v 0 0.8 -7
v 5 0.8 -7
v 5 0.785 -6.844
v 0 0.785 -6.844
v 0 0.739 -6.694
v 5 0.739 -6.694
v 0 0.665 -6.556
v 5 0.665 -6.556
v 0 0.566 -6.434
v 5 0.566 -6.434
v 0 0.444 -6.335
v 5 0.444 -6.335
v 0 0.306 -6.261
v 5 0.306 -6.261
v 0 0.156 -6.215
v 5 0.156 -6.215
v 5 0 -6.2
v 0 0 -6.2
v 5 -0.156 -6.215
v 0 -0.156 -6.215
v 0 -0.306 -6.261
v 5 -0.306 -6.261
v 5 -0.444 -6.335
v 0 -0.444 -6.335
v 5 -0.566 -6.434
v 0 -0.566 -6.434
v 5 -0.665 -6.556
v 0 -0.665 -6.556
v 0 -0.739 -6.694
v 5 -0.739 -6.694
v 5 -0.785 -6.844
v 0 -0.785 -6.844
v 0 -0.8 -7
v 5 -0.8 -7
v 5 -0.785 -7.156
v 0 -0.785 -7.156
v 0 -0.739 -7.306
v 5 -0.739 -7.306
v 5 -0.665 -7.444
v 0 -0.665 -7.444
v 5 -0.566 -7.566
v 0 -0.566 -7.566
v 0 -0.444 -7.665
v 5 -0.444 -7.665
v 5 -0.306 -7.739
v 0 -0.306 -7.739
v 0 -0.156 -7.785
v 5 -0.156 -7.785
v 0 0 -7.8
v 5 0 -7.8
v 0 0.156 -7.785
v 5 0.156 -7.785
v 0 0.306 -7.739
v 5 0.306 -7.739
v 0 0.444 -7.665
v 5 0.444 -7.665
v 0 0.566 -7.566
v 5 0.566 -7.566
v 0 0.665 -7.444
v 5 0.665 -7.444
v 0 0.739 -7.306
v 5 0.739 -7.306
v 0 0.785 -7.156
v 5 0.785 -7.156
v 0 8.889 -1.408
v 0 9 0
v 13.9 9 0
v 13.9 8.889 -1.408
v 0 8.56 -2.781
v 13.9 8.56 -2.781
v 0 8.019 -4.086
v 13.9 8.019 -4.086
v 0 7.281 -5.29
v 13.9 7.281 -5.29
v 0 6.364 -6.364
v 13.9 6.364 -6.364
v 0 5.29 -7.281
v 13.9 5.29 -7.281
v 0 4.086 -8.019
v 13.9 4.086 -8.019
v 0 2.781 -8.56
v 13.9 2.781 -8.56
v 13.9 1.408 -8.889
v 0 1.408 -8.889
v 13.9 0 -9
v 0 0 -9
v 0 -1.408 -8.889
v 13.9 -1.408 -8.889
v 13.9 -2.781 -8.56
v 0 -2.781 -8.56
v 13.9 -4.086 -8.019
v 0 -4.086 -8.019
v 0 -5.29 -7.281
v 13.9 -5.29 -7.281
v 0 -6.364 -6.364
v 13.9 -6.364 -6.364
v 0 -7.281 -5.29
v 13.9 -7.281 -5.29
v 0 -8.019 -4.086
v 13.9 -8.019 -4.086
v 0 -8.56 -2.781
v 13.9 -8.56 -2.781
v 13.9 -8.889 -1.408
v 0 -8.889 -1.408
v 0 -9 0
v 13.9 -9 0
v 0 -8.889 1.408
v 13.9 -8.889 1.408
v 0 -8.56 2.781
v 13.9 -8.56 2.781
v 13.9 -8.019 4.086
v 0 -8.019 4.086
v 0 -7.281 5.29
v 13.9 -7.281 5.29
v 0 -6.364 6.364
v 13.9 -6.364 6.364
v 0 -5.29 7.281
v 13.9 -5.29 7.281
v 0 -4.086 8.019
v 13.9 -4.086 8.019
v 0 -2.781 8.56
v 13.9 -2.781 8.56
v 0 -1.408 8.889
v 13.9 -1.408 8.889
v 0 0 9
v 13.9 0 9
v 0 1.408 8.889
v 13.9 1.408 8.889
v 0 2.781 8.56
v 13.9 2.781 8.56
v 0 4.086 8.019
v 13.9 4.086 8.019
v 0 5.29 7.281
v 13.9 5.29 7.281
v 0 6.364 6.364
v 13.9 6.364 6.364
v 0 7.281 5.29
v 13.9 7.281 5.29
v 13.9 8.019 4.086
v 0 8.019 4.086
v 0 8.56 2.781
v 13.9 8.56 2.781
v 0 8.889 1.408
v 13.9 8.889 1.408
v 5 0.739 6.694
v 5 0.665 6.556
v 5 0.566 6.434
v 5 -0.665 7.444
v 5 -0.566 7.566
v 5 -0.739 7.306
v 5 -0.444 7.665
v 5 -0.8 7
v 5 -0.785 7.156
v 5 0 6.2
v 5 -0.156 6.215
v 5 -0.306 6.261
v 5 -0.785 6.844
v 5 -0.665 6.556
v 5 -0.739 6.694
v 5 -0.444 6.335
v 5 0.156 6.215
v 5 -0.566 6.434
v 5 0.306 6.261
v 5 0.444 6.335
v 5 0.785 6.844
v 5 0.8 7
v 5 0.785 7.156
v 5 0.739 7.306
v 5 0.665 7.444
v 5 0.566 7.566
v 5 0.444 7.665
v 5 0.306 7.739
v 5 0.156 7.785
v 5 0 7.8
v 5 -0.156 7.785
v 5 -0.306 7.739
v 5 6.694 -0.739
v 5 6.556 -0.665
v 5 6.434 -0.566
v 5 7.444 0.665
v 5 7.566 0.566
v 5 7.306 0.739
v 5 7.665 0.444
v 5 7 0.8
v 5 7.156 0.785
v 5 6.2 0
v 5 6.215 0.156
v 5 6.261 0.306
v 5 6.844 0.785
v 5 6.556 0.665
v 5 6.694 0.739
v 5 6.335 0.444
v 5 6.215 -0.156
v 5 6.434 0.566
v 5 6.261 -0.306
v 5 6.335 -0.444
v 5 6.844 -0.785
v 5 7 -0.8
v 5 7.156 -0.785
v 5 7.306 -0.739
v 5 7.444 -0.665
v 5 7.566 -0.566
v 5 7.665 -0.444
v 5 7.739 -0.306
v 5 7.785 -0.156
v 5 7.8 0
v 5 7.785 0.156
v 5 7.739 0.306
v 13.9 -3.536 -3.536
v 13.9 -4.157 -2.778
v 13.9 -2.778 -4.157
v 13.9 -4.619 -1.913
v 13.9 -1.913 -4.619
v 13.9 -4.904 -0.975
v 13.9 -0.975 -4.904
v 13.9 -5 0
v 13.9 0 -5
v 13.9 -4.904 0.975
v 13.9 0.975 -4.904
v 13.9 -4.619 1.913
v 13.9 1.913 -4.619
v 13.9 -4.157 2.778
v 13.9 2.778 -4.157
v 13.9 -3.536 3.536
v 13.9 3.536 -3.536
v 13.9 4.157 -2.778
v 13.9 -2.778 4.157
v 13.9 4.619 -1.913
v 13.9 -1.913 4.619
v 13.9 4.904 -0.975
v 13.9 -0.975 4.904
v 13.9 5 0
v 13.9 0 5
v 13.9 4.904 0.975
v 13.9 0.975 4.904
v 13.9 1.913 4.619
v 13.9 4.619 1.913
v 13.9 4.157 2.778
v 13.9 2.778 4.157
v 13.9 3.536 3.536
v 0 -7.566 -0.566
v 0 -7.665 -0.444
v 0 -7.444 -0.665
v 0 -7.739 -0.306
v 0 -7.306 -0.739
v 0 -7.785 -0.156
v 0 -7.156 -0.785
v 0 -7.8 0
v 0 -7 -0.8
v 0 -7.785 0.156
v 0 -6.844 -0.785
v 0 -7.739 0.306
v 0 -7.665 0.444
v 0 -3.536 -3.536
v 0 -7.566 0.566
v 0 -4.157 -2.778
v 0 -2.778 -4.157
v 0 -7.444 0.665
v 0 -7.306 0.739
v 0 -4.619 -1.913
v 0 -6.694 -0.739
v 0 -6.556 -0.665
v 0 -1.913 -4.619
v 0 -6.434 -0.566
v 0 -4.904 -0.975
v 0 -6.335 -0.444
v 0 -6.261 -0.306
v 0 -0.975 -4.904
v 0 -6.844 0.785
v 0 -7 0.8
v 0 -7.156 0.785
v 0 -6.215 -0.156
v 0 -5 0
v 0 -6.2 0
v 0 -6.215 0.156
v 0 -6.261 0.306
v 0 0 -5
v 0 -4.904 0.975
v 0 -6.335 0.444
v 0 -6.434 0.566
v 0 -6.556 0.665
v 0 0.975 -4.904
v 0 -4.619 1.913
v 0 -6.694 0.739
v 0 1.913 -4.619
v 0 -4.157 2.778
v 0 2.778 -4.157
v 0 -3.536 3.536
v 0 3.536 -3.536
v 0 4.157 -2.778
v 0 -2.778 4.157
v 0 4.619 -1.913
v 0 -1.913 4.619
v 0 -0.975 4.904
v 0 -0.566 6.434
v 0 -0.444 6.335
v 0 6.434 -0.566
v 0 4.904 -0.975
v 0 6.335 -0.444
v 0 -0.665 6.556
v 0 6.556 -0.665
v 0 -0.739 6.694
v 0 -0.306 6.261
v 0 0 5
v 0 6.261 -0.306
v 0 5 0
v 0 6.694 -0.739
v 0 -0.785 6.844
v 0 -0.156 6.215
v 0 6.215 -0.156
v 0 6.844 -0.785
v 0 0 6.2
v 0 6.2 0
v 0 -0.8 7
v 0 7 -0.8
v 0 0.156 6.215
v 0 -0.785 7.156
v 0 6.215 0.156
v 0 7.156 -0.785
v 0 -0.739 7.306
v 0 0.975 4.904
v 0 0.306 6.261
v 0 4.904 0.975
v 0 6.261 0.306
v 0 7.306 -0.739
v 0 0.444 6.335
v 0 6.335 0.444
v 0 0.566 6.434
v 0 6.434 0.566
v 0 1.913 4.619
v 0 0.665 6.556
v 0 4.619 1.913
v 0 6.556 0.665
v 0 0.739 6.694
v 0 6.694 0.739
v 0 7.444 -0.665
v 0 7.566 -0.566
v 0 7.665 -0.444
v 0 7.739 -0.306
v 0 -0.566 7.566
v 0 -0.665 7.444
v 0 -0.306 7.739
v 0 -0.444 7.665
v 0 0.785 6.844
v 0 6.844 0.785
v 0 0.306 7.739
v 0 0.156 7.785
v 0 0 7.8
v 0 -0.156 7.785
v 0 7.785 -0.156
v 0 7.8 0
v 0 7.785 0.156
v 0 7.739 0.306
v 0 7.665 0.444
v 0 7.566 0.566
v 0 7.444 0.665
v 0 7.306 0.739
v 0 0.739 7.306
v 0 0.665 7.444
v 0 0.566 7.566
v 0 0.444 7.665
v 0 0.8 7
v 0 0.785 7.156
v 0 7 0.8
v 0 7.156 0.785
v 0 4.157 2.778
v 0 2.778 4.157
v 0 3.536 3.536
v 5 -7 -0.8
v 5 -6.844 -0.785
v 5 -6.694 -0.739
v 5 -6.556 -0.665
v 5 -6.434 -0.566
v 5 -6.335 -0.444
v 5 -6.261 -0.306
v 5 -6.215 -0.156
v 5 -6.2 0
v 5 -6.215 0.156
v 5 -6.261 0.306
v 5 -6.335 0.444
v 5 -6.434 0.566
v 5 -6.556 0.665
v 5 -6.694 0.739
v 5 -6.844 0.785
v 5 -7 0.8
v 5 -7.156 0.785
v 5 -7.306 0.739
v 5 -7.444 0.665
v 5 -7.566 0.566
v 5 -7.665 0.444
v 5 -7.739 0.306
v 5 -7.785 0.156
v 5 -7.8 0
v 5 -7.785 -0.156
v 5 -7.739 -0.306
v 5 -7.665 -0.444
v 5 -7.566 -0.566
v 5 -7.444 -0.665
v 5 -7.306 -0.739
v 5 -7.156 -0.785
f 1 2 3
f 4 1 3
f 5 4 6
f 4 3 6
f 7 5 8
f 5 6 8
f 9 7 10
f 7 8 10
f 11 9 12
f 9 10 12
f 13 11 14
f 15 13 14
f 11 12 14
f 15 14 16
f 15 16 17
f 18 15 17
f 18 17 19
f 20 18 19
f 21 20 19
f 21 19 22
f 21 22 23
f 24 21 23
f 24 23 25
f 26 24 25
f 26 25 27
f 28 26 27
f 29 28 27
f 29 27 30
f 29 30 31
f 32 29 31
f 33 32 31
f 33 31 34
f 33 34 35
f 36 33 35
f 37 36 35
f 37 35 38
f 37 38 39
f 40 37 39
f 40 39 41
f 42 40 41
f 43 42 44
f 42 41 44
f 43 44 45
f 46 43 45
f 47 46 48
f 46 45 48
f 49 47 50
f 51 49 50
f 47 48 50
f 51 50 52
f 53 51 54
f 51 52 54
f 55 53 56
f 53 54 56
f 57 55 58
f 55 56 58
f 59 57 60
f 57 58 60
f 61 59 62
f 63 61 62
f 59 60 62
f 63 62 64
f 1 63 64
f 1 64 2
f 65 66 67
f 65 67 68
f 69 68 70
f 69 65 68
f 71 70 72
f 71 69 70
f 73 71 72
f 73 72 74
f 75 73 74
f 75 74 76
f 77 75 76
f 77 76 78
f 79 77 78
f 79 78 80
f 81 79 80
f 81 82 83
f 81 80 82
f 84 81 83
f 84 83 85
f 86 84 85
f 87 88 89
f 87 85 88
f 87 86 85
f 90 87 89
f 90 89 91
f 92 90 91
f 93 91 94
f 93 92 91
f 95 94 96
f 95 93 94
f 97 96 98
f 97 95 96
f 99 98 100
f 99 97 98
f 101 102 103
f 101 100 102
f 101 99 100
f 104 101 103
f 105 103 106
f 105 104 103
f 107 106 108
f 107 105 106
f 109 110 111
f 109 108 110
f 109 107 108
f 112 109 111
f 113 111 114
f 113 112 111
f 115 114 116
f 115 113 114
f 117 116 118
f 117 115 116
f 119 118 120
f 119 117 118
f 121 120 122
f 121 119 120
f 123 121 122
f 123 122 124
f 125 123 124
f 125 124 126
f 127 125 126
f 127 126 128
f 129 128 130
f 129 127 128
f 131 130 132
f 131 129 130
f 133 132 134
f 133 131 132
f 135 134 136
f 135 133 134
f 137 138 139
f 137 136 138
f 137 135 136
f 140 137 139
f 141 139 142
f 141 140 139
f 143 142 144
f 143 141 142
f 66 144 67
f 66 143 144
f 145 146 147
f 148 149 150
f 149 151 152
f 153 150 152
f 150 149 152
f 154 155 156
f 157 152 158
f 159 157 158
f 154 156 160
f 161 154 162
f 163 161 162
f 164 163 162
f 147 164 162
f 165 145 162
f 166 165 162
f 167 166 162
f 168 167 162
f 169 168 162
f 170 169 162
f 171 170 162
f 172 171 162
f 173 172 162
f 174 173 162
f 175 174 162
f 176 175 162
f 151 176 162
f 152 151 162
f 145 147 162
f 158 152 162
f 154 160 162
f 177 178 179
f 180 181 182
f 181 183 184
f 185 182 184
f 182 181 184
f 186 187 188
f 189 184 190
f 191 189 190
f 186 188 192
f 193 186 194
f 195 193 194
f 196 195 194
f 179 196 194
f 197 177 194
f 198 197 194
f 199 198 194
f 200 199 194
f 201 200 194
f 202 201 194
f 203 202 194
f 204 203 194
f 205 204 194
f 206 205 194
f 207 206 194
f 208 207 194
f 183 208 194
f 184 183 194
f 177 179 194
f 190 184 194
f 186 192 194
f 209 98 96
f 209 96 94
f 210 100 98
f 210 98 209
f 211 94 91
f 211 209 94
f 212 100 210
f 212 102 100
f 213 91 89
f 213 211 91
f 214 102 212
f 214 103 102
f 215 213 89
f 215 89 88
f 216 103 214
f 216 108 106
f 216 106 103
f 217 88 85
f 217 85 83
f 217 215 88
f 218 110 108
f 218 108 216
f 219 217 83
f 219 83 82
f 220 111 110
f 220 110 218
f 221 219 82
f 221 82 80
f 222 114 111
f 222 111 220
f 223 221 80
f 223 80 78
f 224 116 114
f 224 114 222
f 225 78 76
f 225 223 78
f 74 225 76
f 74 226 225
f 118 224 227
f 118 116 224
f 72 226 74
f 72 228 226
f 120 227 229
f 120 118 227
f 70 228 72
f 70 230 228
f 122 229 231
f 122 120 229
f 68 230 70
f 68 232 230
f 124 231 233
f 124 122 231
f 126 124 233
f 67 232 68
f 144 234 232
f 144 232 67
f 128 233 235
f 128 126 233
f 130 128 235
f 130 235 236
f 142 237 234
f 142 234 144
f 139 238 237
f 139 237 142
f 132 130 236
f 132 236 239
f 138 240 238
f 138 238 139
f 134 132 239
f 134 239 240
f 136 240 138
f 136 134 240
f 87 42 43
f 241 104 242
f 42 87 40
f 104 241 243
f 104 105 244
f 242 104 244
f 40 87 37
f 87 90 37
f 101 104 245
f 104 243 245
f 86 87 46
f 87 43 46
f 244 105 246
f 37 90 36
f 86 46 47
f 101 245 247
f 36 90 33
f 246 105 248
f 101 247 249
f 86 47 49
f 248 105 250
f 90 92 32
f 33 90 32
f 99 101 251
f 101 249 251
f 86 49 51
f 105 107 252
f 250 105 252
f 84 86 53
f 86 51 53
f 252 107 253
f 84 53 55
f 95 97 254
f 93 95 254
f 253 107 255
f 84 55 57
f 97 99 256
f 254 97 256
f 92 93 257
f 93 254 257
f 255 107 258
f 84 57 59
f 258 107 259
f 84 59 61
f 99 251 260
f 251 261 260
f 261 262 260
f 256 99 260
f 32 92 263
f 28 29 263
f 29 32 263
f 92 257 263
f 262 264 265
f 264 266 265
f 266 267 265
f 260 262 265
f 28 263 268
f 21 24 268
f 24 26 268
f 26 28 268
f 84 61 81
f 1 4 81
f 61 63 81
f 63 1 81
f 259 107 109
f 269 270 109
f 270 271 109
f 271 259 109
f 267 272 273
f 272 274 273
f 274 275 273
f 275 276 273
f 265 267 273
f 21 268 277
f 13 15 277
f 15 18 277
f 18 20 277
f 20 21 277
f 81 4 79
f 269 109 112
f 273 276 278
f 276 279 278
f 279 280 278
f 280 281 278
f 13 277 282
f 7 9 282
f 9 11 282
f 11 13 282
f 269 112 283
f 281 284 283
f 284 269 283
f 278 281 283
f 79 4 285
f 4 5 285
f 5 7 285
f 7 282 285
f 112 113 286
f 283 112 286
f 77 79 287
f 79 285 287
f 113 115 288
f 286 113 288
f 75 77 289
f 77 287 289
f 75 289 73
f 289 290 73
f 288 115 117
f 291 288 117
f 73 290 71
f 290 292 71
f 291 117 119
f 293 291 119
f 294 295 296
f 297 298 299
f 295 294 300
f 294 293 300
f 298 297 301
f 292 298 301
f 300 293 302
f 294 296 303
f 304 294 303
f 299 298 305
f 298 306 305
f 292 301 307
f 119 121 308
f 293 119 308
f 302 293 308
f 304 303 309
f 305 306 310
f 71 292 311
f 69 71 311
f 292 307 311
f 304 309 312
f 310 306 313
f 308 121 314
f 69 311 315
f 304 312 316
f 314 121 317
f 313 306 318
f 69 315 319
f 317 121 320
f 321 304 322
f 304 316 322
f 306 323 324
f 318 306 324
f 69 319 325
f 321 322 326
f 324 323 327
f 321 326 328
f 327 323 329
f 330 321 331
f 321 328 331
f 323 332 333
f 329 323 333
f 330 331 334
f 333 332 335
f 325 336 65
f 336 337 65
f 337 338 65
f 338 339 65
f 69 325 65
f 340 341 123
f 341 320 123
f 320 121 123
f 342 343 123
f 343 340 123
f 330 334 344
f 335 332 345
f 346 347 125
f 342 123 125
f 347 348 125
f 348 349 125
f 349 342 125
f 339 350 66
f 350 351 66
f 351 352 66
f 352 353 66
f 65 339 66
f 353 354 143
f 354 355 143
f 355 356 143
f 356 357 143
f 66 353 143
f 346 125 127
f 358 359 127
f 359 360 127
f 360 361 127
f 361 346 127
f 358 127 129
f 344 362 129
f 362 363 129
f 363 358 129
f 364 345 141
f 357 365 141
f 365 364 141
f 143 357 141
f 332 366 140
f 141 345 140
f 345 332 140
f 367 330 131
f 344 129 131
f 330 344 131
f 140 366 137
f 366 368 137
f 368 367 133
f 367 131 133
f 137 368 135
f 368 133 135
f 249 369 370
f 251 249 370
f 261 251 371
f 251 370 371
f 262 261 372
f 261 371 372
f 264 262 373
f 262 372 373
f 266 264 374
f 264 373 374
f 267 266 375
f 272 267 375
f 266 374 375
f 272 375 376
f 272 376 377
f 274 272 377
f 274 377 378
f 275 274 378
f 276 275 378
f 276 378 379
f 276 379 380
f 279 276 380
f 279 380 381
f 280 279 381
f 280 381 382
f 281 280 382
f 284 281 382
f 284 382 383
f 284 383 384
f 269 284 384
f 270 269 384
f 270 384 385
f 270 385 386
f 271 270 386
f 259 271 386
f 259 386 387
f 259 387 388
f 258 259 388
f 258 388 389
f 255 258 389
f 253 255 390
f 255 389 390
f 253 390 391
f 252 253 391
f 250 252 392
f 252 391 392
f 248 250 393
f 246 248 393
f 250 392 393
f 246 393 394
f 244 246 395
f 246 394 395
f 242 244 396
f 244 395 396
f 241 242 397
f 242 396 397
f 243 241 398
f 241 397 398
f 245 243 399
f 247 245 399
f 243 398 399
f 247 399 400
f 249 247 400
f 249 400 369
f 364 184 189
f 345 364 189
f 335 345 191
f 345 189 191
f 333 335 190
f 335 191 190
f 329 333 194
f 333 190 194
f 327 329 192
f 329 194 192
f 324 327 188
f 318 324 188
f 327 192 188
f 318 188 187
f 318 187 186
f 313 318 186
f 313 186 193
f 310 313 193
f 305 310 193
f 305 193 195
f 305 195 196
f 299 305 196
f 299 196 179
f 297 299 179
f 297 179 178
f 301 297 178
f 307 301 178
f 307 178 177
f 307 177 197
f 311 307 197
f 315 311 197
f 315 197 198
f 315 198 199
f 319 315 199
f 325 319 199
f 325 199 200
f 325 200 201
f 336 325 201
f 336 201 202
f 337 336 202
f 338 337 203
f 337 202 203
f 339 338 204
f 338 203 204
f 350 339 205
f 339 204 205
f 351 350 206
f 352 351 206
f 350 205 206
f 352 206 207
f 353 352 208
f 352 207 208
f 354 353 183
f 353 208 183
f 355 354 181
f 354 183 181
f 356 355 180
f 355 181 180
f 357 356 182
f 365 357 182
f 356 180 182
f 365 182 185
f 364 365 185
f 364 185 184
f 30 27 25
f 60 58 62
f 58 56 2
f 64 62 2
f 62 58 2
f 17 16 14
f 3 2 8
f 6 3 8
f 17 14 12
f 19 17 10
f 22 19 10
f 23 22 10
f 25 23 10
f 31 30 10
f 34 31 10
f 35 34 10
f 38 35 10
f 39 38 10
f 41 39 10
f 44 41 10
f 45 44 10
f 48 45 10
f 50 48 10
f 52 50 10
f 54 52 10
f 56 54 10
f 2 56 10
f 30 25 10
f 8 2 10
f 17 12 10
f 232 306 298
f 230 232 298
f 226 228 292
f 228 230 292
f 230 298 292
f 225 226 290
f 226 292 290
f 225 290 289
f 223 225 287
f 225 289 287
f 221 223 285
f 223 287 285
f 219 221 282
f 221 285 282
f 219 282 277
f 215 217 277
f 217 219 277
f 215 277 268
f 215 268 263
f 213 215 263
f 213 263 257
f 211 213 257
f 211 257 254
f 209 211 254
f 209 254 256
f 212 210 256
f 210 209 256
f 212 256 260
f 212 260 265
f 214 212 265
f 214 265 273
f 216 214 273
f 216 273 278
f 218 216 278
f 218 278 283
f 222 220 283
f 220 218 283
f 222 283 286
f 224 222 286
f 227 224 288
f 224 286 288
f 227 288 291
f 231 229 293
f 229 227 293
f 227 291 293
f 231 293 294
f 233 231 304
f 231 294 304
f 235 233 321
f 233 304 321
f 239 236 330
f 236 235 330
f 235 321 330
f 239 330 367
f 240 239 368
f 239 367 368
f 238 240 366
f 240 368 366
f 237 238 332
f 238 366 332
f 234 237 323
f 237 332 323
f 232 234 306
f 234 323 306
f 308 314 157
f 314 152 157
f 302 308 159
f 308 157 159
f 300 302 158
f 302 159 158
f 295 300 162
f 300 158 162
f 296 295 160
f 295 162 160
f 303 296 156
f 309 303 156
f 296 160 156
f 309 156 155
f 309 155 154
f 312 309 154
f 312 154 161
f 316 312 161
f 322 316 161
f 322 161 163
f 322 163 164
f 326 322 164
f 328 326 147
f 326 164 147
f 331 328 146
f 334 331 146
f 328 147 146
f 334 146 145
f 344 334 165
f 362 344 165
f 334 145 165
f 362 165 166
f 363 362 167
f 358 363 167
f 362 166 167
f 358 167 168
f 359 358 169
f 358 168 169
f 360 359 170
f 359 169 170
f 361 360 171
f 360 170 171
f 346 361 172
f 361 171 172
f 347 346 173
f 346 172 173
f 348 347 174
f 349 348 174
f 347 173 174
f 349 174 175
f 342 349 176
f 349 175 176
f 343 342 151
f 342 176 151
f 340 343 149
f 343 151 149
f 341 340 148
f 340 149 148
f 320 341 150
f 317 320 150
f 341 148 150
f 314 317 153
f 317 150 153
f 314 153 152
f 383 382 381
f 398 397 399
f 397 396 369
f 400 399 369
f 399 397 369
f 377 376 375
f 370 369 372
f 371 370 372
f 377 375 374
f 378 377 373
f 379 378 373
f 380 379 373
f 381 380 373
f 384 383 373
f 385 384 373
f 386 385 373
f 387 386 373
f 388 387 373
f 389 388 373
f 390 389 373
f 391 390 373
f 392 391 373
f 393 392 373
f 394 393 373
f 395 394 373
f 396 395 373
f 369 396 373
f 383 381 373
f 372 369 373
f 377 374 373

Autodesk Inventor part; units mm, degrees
ref_plane "YZ Plane" through (0, 0, 0) normal (1, 0, 0) x (0, 1, 0)
ref_plane "XZ Plane" through (0, 0, 0) normal (0, 1, 0) x (-1, 0, 0)
ref_plane "XY Plane" through (0, 0, 0) normal (0, 0, 1) x (1, 0, 0)
sketch "Sketch1" plane through (0, 0, 0) normal (1, 0, 0) x (0, 1, 0)
  circle A0 centre (0, 0) radius 9
  circle A1 centre (0, 0) radius 5
  dimension "d0" = 18
  dimension "d1" = 10
extrude "Extrusion1" add sketch "Sketch1" along normal blind 13.9
sketch "Sketch2" plane through (0, 0, 0) normal (-1, 0, 0) x (0, 0, 1)
  circle A0 centre (0, 0) radius 7
  point P0 (0, 7)
  dimension "d4" = 14
hole "Hole1" at (0, 7, 0) direction (1, 0, 0) diameter 1.6 depth 5
pattern_circular "Circular Pattern1" count 4 over 360 about axis through (0, 0, 0) along (1, 0, 0) of "Hole1"
thread "Thread1" size "M2x0.4" class "6H" standard "ANSI Metric M Profile" full length
thread "Thread2" size "M2x0.4" class "6H" standard "ANSI Metric M Profile" full length
thread "Thread3" size "M2x0.4" class "6H" standard "ANSI Metric M Profile" full length
thread "Thread4" size "M2x0.4" class "6H" standard "ANSI Metric M Profile" full length
properties part number "sample-transfer_rod" material "ABS Plastic orange"
